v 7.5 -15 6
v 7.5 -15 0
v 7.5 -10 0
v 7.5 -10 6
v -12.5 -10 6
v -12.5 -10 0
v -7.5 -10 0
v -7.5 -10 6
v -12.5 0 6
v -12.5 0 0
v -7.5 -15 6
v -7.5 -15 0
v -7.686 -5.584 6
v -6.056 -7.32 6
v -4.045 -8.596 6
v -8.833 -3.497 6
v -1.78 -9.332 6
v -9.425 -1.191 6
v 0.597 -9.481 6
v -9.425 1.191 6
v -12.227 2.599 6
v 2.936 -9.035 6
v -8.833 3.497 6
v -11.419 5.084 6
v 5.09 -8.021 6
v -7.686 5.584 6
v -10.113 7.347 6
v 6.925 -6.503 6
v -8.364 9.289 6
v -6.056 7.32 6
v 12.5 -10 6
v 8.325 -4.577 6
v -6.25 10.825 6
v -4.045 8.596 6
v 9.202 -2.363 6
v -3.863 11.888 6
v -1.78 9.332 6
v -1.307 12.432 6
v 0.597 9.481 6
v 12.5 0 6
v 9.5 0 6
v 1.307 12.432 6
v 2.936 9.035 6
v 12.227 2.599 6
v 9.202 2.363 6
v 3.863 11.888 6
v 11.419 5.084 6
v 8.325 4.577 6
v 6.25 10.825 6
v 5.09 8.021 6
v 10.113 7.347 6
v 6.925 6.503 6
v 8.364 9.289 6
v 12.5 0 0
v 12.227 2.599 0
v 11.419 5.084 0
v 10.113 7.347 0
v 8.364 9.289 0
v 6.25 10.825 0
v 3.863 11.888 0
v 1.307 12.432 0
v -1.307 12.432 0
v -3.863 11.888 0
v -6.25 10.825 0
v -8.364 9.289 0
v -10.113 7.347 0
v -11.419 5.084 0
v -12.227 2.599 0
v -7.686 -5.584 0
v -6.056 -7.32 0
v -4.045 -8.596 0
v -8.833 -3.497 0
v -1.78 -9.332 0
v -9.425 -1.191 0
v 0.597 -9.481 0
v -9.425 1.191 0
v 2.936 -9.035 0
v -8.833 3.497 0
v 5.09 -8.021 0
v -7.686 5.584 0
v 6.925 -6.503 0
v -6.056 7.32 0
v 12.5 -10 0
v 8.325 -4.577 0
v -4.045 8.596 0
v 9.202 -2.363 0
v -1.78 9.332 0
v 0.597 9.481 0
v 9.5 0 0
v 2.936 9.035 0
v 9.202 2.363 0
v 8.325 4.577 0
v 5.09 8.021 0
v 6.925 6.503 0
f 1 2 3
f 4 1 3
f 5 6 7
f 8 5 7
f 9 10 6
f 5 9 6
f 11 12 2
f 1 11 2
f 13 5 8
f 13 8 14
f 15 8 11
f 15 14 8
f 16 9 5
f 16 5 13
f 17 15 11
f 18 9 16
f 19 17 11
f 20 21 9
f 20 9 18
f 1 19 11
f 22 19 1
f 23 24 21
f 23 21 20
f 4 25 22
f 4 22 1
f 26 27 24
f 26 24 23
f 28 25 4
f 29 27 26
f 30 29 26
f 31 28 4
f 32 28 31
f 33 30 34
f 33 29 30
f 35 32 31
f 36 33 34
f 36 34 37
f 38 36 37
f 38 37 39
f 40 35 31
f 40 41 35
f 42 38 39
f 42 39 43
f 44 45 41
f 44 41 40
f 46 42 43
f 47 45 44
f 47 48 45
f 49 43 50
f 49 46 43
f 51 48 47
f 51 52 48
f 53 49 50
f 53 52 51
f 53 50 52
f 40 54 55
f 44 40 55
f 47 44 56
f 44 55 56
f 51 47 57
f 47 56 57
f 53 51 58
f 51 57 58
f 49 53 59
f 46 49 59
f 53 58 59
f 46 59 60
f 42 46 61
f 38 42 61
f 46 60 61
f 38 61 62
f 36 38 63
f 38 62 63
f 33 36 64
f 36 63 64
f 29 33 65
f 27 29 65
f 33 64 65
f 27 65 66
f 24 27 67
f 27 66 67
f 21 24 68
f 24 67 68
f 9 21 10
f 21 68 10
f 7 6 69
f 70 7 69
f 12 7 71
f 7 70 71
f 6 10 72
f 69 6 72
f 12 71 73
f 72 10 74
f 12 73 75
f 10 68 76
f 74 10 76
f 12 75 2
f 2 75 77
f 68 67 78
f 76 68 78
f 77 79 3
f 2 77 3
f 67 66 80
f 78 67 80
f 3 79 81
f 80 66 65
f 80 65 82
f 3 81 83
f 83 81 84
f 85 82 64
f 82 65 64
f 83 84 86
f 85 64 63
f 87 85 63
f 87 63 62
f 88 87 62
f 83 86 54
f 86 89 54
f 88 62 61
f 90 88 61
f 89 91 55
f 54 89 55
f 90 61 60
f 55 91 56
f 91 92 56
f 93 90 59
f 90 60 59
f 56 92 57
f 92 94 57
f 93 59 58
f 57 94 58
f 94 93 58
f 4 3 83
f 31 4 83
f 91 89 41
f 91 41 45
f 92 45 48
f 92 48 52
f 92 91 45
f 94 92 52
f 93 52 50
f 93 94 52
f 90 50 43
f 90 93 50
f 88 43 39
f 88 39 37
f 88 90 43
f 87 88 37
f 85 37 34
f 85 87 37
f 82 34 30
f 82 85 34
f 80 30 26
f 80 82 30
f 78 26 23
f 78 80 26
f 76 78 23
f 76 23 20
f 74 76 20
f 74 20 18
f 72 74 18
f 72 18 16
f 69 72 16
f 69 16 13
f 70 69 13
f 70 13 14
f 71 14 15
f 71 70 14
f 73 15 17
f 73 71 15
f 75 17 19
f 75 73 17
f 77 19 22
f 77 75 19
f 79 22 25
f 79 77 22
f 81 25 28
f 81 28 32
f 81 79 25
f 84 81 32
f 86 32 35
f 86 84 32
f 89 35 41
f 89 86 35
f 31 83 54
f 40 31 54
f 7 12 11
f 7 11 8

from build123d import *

# Parameters (mm, degrees)
CROQUIS1_R              = 9.5
CROQUIS1_W              = 15
CROQUIS1_H              = 5
SALIENTE_EXTRUIR1_DEPTH = 6


with BuildPart() as part:
    # Croquis1 → Saliente-Extruir1 (new body)
    # profile 1 of 2: a face of its own
    with BuildSketch(Plane.XY):
        with BuildLine():
            Line((-12.5, 0), (-12.5, -10))
            Line((-12.5, -10), (-7.5, -10))
            Line((-7.5, -10), (7.5, -10))
            Line((7.5, -10), (12.5, -10))
            Line((12.5, -10), (12.5, 0))
            ThreePointArc((12.5, 0), (0, 12.5), (-12.5, 0))
        make_face()
        Circle(CROQUIS1_R, mode=Mode.SUBTRACT)
    # profile 2 of 2: a face of its own
    with BuildSketch(Plane.XY):
        with Locations((0, -12.5)):
            Rectangle(CROQUIS1_W, CROQUIS1_H)
    extrude(amount=SALIENTE_EXTRUIR1_DEPTH)


solid = part.part
